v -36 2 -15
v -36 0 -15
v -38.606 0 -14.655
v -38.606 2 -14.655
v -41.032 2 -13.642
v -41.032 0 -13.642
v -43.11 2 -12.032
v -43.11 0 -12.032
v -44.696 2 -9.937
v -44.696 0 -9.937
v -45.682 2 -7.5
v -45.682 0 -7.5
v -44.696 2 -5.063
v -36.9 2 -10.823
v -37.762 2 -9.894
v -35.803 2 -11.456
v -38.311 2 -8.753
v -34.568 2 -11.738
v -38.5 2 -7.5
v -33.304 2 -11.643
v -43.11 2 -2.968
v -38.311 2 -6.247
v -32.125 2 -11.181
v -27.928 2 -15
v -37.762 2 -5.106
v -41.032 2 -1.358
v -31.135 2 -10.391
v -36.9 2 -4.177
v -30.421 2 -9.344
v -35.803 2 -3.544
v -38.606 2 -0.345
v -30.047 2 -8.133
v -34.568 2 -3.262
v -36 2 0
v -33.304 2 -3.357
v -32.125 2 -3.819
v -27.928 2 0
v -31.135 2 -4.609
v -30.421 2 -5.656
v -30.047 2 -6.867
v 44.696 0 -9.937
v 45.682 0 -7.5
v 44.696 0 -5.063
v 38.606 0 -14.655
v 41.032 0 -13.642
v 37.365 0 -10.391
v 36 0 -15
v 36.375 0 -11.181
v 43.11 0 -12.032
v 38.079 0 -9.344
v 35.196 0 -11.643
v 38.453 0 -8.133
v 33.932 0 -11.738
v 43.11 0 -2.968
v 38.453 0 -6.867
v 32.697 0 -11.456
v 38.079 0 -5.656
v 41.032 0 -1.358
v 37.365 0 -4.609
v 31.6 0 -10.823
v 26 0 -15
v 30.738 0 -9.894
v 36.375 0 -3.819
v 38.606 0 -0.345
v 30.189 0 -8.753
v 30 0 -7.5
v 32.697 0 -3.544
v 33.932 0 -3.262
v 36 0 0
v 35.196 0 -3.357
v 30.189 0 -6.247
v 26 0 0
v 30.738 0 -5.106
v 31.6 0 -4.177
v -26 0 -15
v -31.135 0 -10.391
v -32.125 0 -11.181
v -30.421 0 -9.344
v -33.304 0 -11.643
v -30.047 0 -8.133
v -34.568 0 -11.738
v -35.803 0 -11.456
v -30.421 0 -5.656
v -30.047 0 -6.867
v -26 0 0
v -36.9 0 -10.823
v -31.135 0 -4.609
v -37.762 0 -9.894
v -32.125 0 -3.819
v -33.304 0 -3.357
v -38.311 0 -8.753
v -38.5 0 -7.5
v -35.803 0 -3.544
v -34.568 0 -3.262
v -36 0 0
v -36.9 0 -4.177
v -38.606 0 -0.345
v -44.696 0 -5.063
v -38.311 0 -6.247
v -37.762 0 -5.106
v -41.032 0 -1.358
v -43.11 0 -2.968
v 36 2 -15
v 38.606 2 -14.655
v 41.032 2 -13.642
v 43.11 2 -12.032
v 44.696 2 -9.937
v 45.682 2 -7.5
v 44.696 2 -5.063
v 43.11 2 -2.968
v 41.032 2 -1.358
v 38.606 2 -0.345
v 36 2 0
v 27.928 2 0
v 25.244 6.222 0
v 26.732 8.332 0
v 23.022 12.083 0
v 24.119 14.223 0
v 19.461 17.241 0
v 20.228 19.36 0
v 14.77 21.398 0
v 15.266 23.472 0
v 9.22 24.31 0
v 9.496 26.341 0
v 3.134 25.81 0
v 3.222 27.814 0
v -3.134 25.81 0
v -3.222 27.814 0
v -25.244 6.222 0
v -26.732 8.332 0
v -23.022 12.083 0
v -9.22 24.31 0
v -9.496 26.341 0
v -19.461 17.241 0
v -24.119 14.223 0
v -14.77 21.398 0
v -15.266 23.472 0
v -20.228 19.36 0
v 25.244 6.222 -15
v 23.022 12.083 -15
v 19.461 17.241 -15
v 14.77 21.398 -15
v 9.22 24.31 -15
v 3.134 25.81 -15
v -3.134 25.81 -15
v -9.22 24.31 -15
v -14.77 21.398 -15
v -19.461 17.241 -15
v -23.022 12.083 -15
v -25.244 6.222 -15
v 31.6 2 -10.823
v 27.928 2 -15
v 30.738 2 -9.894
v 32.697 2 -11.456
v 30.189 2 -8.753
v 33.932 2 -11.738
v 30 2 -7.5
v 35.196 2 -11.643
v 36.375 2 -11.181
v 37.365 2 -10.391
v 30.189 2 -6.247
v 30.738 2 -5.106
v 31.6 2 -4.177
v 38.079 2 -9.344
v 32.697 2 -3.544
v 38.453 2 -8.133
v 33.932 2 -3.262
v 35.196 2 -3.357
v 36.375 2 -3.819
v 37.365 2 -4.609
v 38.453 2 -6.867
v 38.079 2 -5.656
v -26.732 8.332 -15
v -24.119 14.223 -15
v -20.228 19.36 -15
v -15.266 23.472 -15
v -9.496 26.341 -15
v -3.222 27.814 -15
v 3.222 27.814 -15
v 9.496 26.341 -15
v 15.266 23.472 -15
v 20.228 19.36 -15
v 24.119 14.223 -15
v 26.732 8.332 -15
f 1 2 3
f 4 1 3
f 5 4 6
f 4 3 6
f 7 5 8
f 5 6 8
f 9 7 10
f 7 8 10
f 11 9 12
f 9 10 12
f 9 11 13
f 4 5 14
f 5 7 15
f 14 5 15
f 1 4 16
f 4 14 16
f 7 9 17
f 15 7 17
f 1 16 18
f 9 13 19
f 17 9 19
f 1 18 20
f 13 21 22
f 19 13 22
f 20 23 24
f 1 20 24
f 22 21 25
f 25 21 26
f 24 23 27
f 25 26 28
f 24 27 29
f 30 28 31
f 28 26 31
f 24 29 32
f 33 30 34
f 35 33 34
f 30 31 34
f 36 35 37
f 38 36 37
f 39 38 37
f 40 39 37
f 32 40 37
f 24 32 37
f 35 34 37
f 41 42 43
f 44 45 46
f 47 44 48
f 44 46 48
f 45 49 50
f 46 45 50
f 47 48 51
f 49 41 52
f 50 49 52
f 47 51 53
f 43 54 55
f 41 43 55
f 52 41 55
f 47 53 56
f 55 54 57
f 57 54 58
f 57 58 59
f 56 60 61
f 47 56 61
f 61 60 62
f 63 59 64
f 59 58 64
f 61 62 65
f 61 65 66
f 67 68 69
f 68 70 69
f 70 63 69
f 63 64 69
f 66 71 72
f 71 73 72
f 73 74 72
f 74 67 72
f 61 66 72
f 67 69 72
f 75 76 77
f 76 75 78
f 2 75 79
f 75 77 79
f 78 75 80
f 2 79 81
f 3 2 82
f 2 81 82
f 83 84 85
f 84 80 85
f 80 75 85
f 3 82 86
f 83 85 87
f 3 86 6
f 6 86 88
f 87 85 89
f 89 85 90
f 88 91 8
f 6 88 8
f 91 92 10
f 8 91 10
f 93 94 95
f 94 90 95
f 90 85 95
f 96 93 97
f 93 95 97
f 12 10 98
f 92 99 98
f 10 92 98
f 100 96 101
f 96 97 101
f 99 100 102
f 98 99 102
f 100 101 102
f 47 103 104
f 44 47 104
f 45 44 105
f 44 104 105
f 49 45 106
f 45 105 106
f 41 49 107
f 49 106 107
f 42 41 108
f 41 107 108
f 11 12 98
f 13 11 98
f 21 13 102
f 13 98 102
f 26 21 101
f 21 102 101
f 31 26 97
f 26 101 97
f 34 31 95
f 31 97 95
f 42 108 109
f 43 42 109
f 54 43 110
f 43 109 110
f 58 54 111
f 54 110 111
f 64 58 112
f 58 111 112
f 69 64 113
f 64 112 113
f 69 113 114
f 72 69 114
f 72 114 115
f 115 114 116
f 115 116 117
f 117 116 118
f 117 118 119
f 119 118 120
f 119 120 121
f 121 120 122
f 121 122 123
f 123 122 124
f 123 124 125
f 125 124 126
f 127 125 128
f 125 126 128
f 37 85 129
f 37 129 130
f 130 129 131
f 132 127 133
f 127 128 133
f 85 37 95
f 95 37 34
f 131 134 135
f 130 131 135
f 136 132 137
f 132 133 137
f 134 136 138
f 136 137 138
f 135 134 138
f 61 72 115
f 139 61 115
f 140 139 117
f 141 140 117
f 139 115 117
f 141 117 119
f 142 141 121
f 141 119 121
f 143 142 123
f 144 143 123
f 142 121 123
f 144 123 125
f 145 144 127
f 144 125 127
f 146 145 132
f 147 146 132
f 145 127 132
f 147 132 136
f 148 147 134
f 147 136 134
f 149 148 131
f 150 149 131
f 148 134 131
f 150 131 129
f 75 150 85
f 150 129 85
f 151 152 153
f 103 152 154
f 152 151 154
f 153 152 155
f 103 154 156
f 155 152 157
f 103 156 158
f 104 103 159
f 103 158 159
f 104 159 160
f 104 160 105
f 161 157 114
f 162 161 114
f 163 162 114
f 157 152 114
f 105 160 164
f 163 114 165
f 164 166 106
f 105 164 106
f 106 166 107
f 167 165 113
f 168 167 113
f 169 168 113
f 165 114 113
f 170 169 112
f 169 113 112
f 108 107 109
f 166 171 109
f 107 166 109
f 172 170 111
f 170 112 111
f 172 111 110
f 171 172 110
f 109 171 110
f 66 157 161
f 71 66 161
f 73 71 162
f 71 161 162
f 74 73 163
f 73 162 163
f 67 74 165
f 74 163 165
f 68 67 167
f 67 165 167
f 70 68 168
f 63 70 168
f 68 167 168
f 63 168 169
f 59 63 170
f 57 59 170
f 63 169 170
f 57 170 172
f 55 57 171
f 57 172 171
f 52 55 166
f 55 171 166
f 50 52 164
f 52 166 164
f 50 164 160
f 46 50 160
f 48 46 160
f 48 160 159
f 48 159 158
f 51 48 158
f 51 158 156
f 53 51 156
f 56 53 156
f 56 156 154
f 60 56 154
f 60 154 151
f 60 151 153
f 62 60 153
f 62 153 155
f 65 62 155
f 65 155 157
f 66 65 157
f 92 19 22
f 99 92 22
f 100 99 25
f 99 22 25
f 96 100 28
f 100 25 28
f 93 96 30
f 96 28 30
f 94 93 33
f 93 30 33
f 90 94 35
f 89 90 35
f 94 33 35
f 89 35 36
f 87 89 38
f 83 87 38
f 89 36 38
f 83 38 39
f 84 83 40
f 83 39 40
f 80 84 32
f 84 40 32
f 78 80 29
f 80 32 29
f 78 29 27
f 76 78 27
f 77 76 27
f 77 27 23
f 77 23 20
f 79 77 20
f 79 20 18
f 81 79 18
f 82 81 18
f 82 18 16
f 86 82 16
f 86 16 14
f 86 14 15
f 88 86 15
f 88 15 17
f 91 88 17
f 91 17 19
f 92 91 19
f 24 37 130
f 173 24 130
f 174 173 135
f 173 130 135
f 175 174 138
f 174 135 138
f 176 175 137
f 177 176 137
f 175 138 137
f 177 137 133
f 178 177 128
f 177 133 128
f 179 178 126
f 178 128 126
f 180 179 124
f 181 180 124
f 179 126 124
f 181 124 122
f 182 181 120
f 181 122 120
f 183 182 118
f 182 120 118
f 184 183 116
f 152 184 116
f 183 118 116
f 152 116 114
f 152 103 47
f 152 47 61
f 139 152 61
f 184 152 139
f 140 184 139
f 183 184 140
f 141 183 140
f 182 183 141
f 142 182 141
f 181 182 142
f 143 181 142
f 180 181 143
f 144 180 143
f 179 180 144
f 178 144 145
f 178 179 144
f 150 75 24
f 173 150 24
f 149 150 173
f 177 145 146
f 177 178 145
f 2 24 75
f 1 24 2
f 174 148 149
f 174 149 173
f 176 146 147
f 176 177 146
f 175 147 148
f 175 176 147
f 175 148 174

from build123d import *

# Parameters (mm, degrees)
EXTRUDE_THIN2_DEPTH = 15
SKETCH6_R           = 4.25
CUT_EXTRUDE1_DEPTH  = 55.927224579
FILLET1_R           = 10


with BuildPart() as part:
    # Sketch1 → Extrude-Thin2 (new body)
    with BuildSketch(Plane.XY):
        with BuildLine():
            Line((46, 0), (26, 0))
            ThreePointArc((26, 0), (0, 26), (-26, 0))
            Line((-26, 0), (-46, 0))
            Line((-46, 0), (-46, 2))
            Line((-46, 2), (-27.928480088, 2))
            ThreePointArc((-27.928480088, 2), (0, 28), (27.928480088, 2))
            Line((27.928480088, 2), (46, 2))
            Line((46, 2), (46, 0))
        make_face()
    extrude(amount=-EXTRUDE_THIN2_DEPTH)

    # Sketch6 → Cut-Extrude1 (cut, through all)
    with BuildSketch(Plane(origin=(0, 2, 0), x_dir=(1, 0, 0), z_dir=(0, 1, 0))):
        with Locations(Location((-34.25, 7.5, 0), (0, 0, 180))):
            Circle(SKETCH6_R)
        with Locations(Location((34.25, 7.5, 0), (0, 0, 180))):
            Circle(SKETCH6_R)
    extrude(amount=-CUT_EXTRUDE1_DEPTH, mode=Mode.SUBTRACT)

    # Fillet1
    # the kernel refuses this fillet: 10 mm, written as the material it takes off along each edge
    with BuildSketch(Plane(origin=(-46, -25, -15), x_dir=(1, 0, 0), z_dir=(0, 1, 0)), Plane(origin=(46, 27, -15), x_dir=(-1, 0, 0), z_dir=(0, -1, 0))) as fillet1_piece_1:
        with BuildLine():
            CenterArc((FILLET1_R, -FILLET1_R), FILLET1_R, 90, 90)
            Line((0, -FILLET1_R), (0, 0))
            Line((0, 0), (FILLET1_R, 0))
        make_face()
    extrude(amount=52, mode=Mode.SUBTRACT)
    with BuildSketch(Plane(origin=(-46, -25, 0), x_dir=(1, 0, 0), z_dir=(0, 1, 0)), Plane(origin=(46, 27, 0), x_dir=(-1, 0, 0), z_dir=(0, -1, 0))) as fillet1_piece_2:
        with BuildLine():
            CenterArc((FILLET1_R, FILLET1_R), FILLET1_R, 180, 90)
            Line((0, FILLET1_R), (0, 0))
            Line((0, 0), (FILLET1_R, 0))
        make_face()
    extrude(amount=52, mode=Mode.SUBTRACT)


solid = part.part
